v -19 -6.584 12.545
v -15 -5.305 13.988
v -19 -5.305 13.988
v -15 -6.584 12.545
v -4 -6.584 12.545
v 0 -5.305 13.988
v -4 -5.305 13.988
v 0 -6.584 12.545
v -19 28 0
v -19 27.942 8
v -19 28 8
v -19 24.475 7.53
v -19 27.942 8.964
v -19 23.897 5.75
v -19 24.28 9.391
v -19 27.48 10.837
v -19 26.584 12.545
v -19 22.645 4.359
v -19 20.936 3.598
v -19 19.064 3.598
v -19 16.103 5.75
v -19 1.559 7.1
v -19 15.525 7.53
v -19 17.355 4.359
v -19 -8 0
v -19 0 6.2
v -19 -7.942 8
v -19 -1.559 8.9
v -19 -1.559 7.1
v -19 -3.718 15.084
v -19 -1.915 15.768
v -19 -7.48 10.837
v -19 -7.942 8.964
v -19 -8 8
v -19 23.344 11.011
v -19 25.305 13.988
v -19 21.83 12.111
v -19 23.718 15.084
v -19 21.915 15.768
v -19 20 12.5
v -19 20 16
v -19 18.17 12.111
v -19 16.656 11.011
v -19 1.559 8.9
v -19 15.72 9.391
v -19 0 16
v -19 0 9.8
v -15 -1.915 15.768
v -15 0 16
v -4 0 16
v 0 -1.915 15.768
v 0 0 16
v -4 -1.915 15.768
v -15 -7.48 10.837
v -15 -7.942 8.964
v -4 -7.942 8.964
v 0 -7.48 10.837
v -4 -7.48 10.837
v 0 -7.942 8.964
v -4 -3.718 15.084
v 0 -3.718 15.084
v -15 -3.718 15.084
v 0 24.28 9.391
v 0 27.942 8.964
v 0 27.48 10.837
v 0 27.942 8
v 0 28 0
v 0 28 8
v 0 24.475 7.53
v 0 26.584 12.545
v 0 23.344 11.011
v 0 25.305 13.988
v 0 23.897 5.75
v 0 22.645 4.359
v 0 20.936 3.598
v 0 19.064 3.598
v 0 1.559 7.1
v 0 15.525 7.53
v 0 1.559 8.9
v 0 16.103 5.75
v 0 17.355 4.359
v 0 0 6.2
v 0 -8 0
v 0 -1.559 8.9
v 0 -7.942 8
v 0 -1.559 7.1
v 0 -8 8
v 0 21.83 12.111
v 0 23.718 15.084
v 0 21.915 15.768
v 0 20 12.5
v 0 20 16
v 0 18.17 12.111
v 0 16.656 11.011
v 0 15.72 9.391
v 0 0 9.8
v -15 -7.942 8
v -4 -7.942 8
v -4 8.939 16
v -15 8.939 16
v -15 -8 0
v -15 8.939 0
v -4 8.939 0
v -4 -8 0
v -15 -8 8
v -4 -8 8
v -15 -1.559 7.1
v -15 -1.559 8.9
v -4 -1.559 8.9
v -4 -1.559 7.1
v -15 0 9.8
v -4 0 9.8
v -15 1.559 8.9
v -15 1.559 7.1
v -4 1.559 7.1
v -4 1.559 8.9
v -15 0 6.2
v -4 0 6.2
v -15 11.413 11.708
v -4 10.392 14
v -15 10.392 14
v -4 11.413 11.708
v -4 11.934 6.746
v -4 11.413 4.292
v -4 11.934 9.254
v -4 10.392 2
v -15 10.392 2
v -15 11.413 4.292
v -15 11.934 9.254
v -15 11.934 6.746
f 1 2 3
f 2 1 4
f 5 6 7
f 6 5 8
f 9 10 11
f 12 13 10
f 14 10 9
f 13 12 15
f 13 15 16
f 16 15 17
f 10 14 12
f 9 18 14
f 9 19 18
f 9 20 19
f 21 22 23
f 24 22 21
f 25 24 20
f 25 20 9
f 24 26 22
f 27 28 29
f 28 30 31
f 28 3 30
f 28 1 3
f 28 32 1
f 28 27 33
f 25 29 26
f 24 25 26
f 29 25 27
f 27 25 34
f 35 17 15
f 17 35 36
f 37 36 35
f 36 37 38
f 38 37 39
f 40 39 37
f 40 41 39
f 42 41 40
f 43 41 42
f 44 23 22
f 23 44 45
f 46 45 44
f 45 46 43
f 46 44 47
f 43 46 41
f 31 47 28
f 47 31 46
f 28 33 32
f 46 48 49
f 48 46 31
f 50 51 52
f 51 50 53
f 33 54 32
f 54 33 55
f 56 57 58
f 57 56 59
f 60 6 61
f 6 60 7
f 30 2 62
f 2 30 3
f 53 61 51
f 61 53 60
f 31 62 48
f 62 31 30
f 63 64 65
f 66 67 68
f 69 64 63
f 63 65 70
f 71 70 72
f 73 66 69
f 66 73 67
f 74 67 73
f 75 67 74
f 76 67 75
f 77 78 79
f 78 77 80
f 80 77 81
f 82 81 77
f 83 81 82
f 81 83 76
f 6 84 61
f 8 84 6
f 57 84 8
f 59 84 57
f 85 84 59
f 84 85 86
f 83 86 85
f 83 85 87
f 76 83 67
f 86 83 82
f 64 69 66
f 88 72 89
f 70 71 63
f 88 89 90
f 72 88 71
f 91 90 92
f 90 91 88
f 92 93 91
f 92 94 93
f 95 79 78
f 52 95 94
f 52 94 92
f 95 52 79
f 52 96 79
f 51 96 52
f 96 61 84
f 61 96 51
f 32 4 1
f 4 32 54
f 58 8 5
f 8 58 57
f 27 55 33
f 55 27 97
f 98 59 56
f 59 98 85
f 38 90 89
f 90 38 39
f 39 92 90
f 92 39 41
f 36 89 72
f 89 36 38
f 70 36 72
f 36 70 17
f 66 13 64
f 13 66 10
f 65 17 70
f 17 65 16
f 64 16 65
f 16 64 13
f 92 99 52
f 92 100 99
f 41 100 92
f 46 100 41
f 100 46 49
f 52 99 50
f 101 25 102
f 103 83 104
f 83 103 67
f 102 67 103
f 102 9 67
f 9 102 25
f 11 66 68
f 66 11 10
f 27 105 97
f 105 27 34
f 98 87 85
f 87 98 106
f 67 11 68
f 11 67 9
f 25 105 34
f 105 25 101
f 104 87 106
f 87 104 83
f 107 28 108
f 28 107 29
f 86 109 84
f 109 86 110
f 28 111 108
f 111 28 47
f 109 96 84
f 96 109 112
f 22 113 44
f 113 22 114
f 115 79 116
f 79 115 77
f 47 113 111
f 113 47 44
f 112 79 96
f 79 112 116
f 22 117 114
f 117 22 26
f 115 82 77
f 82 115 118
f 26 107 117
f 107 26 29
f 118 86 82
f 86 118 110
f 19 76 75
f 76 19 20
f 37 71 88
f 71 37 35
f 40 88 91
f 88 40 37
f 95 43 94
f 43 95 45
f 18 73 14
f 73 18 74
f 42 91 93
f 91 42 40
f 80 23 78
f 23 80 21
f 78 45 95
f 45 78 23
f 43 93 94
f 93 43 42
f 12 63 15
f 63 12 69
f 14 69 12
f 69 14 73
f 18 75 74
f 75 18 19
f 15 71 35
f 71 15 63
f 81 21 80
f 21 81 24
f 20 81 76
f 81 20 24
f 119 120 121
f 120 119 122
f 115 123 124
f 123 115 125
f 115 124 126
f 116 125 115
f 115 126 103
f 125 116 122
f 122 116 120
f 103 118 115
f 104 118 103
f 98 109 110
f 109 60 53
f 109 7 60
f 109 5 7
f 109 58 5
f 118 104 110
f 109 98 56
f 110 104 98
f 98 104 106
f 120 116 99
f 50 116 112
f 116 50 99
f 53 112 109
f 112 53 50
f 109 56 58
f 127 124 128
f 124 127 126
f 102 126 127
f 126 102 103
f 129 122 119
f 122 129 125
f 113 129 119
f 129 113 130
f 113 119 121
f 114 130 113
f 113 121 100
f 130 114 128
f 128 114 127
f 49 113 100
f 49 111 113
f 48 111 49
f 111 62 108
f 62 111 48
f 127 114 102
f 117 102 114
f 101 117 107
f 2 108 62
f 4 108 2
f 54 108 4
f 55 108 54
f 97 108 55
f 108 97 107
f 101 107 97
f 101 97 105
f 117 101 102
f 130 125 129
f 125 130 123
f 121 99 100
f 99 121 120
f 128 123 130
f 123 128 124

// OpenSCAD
// PRUSA iteration3
// Y idler
// GNU GPL v3
// Josef Průša <iam@josefprusa.cz> and contributors
// http://www.reprap.org/wiki/Prusa_Mendel
// http://prusamendel.org

module y_idler_base() {
 translate(v = [0, 0, 0]) cylinder(h = 19, r = 8);	
 translate(v = [0, 20, 0]) cylinder(h = 19, r = 8);
 translate(v = [0, 10, 9.5]) cube(size = [16, 20, 19], center = true);
 translate(v = [-4, 10, 9.5]) cube(size = [8, 16 + 20, 19], center = true);
}

module y_idler_holes() {
 // Bearing axis holes 
 translate(v = [0, 0, -1]) cylinder(h = 120, r = 1.8);	
 // Frame rod (M8)
 translate(v = [0, 20, -1]) cylinder(h = 25, r = 4.5);
 // Bearing space
 translate(v = [0, 0, 4]) cylinder(h = 11, r = 12);
}

// Final part
module y_idler() {
 translate(v = [0, 0, 8]) rotate([0, -90, 0]) difference() {
  y_idler_base();
  y_idler_holes();
 }
}

y_idler();
